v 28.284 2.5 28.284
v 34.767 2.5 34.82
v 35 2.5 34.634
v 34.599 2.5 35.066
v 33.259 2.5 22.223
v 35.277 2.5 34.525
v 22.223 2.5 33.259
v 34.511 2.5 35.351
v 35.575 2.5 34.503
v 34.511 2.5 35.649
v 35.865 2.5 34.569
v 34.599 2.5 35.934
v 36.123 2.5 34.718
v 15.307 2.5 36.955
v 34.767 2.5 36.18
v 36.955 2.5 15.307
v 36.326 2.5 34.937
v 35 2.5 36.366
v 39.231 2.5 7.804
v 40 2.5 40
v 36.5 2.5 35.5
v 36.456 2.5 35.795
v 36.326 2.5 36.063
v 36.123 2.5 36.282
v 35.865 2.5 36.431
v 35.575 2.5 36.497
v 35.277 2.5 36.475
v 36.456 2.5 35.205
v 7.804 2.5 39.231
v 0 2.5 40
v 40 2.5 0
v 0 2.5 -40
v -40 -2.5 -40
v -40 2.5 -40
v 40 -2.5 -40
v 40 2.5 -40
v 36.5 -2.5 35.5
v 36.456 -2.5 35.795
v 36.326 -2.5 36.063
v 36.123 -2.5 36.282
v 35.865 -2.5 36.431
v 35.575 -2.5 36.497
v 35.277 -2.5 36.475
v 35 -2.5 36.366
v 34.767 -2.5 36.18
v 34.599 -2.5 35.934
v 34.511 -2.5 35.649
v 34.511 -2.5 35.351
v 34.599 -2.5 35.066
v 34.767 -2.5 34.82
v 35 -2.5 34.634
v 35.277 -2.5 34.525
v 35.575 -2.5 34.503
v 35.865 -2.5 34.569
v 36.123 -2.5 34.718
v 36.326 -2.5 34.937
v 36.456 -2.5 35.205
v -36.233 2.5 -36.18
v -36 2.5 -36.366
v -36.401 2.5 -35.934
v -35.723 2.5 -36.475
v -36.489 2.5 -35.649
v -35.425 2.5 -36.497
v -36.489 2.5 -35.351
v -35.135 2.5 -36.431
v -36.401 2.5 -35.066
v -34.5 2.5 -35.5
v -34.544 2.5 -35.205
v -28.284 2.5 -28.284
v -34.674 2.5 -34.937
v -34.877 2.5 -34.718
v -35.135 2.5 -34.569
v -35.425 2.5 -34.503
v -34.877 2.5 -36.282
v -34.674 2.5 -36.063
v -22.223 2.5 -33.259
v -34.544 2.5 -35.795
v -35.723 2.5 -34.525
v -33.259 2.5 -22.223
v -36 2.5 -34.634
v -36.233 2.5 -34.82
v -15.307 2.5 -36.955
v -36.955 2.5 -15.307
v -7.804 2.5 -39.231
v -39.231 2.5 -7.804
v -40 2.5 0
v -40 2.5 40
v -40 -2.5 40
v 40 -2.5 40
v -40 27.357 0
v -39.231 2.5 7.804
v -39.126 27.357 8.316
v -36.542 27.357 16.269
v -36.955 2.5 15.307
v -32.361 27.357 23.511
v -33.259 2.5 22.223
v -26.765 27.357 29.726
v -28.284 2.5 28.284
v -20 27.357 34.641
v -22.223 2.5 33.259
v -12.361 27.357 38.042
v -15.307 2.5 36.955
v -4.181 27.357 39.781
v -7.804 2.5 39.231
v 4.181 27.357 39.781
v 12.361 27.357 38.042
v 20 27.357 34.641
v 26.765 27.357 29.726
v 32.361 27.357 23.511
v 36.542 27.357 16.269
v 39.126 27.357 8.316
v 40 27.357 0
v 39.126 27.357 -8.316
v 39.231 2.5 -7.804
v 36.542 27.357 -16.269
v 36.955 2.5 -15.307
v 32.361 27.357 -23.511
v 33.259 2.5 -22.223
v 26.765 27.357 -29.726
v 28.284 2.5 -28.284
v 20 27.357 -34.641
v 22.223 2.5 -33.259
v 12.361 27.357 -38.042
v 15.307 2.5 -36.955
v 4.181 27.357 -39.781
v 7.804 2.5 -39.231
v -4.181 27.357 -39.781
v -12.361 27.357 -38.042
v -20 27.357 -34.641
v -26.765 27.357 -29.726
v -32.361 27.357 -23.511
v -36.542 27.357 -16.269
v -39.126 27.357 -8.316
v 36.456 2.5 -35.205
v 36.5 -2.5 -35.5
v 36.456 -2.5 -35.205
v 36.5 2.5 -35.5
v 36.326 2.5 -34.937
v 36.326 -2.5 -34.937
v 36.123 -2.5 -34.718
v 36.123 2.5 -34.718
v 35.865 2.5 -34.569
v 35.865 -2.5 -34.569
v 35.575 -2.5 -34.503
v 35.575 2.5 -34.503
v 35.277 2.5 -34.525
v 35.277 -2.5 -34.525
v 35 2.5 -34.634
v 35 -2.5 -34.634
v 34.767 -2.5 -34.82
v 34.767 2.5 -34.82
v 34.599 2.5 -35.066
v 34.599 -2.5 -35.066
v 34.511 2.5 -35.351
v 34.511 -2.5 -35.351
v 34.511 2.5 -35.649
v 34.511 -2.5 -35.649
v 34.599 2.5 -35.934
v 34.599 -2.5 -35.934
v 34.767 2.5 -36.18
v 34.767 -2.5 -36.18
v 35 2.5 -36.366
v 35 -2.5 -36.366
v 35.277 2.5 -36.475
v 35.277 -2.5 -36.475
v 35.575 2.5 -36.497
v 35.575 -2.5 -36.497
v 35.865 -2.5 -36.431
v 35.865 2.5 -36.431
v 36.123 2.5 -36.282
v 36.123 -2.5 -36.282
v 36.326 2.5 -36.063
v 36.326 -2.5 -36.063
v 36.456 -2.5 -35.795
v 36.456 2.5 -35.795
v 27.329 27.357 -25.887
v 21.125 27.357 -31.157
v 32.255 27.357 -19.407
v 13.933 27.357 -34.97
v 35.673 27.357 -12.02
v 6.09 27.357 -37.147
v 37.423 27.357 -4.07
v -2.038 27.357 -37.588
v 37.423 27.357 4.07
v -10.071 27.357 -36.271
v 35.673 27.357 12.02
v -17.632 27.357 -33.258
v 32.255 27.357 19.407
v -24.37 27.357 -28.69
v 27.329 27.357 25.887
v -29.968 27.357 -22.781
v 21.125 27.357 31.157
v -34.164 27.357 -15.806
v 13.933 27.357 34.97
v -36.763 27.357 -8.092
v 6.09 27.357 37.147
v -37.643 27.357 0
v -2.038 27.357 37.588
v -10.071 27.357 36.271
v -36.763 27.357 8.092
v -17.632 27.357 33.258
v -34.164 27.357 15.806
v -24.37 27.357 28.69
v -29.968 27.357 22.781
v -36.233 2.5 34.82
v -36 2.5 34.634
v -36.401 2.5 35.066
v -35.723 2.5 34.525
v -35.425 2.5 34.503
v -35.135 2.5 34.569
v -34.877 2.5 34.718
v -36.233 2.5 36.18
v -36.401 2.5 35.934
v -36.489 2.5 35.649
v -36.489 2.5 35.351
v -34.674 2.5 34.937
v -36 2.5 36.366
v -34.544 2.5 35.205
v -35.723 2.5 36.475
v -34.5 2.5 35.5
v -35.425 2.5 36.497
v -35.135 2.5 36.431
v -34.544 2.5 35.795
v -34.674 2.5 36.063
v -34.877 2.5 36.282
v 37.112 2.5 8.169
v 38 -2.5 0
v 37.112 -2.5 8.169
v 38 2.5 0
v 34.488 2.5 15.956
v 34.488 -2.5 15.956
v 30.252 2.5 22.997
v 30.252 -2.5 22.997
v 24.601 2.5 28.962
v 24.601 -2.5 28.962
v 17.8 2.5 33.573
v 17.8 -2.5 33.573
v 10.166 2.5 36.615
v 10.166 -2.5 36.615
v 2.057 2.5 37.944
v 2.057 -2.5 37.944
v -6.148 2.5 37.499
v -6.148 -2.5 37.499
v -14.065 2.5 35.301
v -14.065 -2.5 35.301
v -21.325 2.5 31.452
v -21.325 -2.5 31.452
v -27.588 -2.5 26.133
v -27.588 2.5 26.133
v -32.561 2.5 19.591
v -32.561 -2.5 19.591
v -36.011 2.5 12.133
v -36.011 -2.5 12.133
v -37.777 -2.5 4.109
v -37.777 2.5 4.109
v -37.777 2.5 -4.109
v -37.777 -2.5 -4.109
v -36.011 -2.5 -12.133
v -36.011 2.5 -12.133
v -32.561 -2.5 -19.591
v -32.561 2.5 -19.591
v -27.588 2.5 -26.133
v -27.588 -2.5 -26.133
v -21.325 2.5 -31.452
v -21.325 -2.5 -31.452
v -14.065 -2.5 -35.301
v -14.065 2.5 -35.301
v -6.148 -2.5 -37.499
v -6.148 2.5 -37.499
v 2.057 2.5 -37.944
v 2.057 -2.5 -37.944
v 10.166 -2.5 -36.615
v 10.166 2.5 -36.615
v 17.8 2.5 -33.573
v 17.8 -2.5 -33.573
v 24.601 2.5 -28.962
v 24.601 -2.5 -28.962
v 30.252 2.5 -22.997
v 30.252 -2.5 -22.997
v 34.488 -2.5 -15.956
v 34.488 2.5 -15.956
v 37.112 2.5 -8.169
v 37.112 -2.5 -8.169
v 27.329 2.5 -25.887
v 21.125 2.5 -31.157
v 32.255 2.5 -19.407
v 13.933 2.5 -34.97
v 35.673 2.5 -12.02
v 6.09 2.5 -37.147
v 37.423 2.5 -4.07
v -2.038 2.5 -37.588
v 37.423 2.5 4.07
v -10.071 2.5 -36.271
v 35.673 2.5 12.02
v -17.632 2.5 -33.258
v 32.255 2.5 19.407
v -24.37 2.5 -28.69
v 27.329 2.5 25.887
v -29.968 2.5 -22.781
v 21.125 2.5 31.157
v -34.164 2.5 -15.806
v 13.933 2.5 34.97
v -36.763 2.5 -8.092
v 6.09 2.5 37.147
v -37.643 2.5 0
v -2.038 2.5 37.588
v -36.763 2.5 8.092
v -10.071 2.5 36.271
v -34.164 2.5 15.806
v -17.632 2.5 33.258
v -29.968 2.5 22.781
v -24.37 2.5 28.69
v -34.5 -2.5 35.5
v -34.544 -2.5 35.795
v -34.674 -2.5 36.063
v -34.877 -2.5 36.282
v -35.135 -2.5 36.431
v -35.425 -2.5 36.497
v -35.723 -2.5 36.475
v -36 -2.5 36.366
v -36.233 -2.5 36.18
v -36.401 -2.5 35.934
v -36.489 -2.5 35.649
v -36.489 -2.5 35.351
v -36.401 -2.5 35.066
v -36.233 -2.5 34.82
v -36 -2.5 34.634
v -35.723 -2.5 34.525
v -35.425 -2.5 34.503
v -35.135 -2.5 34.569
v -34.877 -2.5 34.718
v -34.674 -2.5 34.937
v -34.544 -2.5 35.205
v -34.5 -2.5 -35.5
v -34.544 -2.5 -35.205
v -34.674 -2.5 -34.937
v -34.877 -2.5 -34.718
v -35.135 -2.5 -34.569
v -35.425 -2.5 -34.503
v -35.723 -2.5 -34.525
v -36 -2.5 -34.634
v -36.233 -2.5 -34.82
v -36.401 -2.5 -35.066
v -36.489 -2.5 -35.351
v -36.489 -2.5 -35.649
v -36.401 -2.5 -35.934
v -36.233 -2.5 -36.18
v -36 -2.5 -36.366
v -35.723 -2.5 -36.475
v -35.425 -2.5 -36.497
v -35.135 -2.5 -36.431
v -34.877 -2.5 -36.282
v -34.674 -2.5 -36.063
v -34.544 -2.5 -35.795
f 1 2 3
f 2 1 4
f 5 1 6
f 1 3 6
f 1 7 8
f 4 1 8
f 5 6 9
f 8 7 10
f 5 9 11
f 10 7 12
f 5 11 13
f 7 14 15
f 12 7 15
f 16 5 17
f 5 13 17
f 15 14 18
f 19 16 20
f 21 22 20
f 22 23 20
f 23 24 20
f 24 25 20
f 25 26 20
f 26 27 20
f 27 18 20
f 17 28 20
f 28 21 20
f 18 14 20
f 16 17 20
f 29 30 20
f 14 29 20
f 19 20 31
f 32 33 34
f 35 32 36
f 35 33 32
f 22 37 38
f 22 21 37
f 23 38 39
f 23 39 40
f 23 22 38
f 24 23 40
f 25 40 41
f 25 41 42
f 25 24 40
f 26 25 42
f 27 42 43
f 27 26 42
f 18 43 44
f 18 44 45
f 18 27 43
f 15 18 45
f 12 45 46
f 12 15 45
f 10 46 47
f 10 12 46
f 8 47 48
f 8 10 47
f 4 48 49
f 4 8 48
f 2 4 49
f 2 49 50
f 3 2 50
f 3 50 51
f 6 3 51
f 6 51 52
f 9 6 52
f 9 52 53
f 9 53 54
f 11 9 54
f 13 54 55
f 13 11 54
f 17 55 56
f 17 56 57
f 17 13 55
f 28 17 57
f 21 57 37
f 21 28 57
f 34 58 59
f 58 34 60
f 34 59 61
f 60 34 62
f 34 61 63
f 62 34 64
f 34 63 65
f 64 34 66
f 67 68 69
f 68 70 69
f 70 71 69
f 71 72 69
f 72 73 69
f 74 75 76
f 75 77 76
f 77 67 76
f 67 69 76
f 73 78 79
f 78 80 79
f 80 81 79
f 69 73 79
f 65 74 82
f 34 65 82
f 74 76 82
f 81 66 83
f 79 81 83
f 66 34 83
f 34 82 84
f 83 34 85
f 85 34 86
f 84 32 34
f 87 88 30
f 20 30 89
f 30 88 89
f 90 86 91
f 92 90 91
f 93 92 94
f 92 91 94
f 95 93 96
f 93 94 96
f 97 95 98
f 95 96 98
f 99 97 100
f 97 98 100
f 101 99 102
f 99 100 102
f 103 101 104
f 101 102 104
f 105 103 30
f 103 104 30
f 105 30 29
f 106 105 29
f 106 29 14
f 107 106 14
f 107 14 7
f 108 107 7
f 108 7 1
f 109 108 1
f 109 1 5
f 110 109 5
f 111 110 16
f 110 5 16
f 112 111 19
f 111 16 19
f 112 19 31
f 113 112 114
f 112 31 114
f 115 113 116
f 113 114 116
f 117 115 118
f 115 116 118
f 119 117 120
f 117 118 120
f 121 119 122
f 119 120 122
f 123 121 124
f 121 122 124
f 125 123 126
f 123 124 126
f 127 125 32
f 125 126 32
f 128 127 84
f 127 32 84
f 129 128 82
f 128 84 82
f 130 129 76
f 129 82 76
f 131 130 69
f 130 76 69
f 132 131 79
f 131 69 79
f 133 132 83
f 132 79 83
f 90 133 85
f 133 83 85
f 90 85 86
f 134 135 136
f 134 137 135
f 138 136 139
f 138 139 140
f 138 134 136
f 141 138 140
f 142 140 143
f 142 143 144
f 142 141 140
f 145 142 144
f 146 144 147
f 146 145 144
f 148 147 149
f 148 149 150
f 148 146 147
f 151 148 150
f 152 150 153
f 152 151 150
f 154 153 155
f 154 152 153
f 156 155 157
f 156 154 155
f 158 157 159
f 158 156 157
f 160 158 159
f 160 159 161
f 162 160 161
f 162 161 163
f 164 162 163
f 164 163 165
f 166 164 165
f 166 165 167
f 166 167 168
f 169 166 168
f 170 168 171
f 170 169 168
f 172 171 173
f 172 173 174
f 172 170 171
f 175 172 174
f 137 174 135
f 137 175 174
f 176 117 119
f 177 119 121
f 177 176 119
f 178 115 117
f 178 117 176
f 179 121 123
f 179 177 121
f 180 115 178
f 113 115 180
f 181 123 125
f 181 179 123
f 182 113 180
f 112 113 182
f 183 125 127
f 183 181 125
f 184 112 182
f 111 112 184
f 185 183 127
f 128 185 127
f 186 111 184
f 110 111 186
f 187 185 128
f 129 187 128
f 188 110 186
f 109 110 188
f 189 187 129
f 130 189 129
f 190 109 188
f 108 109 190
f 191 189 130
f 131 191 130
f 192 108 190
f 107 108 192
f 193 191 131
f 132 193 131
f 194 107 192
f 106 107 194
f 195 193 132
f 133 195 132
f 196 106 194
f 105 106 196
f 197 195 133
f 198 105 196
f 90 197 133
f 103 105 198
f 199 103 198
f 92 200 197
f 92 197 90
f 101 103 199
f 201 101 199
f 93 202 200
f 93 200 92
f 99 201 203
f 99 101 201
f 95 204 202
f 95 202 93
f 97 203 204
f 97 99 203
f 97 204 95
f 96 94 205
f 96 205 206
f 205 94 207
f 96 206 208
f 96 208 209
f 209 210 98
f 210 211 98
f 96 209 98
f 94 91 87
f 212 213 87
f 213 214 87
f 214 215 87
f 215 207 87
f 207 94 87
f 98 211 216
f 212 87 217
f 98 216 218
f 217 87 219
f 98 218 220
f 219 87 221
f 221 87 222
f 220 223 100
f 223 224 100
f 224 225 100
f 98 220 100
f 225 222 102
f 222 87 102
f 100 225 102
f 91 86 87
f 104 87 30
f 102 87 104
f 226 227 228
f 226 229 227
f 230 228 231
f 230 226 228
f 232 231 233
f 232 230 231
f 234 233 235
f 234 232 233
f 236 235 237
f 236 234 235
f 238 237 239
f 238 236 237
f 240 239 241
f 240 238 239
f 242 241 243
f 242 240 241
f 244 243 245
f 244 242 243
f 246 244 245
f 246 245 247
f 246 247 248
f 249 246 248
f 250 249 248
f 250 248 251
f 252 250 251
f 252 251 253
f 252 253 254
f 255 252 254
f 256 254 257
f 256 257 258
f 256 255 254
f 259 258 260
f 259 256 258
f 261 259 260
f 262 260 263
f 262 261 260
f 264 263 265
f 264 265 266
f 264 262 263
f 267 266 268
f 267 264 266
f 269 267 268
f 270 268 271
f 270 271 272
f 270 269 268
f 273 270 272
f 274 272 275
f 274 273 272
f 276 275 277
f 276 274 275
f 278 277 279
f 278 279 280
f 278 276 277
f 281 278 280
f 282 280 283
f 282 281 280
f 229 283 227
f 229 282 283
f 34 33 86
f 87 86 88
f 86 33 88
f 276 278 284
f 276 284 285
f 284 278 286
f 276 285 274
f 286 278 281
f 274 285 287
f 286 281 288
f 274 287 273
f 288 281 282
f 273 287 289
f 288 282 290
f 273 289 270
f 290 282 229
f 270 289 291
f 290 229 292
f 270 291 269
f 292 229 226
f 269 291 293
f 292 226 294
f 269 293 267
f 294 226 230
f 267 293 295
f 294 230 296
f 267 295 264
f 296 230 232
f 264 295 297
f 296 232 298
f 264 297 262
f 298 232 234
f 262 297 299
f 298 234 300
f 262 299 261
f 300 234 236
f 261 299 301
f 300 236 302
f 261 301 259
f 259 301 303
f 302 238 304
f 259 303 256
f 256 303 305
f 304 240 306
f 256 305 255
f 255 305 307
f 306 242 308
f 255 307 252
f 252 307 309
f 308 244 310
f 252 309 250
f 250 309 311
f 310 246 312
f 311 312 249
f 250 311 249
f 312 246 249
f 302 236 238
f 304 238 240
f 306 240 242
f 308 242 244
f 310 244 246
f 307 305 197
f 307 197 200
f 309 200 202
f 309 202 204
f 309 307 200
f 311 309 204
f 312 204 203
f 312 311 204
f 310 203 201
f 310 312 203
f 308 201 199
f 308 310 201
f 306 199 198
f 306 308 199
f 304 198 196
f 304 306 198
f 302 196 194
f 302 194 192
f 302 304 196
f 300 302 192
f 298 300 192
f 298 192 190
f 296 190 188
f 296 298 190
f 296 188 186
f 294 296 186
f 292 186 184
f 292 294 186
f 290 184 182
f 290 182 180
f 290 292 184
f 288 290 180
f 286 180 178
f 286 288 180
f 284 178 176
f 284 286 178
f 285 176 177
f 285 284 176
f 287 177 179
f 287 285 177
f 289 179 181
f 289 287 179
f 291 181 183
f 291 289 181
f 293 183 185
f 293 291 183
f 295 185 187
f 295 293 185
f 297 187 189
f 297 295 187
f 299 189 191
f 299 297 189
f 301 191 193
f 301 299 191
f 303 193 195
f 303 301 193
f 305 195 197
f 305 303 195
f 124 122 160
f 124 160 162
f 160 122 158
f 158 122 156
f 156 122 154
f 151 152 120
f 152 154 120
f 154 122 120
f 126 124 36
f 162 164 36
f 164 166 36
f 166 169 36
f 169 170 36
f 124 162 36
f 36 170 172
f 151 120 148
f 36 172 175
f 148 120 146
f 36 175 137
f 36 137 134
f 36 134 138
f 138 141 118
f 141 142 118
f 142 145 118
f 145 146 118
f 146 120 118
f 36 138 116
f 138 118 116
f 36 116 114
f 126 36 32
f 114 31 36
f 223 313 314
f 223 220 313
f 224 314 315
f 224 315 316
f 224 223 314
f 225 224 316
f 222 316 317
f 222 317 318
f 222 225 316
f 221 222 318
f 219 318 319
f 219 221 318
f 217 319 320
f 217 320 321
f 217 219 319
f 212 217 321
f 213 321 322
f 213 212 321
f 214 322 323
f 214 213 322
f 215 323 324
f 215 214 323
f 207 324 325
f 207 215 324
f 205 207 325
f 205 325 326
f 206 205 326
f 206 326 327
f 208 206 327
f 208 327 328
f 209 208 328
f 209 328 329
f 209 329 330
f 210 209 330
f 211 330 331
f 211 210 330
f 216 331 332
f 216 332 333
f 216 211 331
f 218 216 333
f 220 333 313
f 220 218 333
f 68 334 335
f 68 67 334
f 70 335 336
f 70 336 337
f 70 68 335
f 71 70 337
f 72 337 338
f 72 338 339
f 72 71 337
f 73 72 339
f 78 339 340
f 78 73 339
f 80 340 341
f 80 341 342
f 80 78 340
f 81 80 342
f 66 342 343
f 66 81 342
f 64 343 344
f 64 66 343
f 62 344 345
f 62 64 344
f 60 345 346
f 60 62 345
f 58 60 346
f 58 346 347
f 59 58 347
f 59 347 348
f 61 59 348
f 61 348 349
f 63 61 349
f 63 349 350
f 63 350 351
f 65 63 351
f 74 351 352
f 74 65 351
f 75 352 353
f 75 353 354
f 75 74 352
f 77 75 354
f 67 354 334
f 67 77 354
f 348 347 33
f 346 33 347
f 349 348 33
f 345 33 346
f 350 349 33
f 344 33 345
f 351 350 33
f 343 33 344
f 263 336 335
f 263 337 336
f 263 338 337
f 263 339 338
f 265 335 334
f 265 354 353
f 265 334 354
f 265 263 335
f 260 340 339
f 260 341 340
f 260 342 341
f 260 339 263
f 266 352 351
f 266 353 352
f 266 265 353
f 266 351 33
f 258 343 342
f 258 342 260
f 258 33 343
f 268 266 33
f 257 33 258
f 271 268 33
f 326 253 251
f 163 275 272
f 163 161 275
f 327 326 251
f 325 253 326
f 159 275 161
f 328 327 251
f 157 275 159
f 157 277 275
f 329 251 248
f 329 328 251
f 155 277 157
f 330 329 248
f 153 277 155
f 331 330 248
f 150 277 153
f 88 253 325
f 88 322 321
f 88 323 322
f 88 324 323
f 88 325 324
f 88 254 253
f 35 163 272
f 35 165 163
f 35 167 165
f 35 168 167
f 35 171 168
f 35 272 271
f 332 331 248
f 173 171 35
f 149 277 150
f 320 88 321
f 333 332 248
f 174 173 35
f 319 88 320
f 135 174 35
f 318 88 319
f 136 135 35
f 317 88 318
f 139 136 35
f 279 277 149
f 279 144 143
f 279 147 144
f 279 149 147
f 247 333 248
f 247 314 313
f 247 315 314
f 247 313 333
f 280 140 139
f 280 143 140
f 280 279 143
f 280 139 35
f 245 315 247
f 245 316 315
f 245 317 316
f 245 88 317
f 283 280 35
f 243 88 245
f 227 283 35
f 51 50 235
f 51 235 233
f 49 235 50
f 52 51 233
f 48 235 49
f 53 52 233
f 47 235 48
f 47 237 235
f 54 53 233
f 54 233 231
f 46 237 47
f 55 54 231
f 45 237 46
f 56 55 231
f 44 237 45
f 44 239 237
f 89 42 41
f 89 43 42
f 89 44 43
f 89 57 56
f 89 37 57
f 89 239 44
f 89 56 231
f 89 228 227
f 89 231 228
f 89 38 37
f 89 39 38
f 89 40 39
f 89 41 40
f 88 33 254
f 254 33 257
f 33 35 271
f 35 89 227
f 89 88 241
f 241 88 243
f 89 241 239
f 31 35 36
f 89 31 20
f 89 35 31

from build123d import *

# Parameters (mm, degrees)
F0_W     = 80
F0_H     = 80
F0_R     = 1
F0_R_2   = 38
F1_DEPTH = 2.5
F3_R     = 40
F3_R_2   = 37.6432669416
F4_DEPTH = 24.8567536473


with BuildPart() as f1:
    # F0 (on Front) → F1 (new body, symmetric)
    with BuildSketch(Plane.XZ):
        Rectangle(F0_W, F0_H)
        with Locations((-35.5, -35.5)):
            Circle(F0_R, mode=Mode.SUBTRACT)
        with Locations((35.5, -35.5)):
            Circle(F0_R, mode=Mode.SUBTRACT)
        with Locations((-35.5, 35.5)):
            Circle(F0_R, mode=Mode.SUBTRACT)
        Circle(F0_R_2, mode=Mode.SUBTRACT)
        with Locations((35.5, 35.5)):
            Circle(F0_R, mode=Mode.SUBTRACT)
    extrude(amount=F1_DEPTH, both=True)

    # F3 (on face) → F4 (join)
    with BuildSketch(Plane(origin=(0, 2.5, 0), x_dir=(-1, 0, 0), z_dir=(0, 1, 0))):
        Circle(F3_R)
        Circle(F3_R_2, mode=Mode.SUBTRACT)
    extrude(amount=F4_DEPTH)


solid = f1.part
